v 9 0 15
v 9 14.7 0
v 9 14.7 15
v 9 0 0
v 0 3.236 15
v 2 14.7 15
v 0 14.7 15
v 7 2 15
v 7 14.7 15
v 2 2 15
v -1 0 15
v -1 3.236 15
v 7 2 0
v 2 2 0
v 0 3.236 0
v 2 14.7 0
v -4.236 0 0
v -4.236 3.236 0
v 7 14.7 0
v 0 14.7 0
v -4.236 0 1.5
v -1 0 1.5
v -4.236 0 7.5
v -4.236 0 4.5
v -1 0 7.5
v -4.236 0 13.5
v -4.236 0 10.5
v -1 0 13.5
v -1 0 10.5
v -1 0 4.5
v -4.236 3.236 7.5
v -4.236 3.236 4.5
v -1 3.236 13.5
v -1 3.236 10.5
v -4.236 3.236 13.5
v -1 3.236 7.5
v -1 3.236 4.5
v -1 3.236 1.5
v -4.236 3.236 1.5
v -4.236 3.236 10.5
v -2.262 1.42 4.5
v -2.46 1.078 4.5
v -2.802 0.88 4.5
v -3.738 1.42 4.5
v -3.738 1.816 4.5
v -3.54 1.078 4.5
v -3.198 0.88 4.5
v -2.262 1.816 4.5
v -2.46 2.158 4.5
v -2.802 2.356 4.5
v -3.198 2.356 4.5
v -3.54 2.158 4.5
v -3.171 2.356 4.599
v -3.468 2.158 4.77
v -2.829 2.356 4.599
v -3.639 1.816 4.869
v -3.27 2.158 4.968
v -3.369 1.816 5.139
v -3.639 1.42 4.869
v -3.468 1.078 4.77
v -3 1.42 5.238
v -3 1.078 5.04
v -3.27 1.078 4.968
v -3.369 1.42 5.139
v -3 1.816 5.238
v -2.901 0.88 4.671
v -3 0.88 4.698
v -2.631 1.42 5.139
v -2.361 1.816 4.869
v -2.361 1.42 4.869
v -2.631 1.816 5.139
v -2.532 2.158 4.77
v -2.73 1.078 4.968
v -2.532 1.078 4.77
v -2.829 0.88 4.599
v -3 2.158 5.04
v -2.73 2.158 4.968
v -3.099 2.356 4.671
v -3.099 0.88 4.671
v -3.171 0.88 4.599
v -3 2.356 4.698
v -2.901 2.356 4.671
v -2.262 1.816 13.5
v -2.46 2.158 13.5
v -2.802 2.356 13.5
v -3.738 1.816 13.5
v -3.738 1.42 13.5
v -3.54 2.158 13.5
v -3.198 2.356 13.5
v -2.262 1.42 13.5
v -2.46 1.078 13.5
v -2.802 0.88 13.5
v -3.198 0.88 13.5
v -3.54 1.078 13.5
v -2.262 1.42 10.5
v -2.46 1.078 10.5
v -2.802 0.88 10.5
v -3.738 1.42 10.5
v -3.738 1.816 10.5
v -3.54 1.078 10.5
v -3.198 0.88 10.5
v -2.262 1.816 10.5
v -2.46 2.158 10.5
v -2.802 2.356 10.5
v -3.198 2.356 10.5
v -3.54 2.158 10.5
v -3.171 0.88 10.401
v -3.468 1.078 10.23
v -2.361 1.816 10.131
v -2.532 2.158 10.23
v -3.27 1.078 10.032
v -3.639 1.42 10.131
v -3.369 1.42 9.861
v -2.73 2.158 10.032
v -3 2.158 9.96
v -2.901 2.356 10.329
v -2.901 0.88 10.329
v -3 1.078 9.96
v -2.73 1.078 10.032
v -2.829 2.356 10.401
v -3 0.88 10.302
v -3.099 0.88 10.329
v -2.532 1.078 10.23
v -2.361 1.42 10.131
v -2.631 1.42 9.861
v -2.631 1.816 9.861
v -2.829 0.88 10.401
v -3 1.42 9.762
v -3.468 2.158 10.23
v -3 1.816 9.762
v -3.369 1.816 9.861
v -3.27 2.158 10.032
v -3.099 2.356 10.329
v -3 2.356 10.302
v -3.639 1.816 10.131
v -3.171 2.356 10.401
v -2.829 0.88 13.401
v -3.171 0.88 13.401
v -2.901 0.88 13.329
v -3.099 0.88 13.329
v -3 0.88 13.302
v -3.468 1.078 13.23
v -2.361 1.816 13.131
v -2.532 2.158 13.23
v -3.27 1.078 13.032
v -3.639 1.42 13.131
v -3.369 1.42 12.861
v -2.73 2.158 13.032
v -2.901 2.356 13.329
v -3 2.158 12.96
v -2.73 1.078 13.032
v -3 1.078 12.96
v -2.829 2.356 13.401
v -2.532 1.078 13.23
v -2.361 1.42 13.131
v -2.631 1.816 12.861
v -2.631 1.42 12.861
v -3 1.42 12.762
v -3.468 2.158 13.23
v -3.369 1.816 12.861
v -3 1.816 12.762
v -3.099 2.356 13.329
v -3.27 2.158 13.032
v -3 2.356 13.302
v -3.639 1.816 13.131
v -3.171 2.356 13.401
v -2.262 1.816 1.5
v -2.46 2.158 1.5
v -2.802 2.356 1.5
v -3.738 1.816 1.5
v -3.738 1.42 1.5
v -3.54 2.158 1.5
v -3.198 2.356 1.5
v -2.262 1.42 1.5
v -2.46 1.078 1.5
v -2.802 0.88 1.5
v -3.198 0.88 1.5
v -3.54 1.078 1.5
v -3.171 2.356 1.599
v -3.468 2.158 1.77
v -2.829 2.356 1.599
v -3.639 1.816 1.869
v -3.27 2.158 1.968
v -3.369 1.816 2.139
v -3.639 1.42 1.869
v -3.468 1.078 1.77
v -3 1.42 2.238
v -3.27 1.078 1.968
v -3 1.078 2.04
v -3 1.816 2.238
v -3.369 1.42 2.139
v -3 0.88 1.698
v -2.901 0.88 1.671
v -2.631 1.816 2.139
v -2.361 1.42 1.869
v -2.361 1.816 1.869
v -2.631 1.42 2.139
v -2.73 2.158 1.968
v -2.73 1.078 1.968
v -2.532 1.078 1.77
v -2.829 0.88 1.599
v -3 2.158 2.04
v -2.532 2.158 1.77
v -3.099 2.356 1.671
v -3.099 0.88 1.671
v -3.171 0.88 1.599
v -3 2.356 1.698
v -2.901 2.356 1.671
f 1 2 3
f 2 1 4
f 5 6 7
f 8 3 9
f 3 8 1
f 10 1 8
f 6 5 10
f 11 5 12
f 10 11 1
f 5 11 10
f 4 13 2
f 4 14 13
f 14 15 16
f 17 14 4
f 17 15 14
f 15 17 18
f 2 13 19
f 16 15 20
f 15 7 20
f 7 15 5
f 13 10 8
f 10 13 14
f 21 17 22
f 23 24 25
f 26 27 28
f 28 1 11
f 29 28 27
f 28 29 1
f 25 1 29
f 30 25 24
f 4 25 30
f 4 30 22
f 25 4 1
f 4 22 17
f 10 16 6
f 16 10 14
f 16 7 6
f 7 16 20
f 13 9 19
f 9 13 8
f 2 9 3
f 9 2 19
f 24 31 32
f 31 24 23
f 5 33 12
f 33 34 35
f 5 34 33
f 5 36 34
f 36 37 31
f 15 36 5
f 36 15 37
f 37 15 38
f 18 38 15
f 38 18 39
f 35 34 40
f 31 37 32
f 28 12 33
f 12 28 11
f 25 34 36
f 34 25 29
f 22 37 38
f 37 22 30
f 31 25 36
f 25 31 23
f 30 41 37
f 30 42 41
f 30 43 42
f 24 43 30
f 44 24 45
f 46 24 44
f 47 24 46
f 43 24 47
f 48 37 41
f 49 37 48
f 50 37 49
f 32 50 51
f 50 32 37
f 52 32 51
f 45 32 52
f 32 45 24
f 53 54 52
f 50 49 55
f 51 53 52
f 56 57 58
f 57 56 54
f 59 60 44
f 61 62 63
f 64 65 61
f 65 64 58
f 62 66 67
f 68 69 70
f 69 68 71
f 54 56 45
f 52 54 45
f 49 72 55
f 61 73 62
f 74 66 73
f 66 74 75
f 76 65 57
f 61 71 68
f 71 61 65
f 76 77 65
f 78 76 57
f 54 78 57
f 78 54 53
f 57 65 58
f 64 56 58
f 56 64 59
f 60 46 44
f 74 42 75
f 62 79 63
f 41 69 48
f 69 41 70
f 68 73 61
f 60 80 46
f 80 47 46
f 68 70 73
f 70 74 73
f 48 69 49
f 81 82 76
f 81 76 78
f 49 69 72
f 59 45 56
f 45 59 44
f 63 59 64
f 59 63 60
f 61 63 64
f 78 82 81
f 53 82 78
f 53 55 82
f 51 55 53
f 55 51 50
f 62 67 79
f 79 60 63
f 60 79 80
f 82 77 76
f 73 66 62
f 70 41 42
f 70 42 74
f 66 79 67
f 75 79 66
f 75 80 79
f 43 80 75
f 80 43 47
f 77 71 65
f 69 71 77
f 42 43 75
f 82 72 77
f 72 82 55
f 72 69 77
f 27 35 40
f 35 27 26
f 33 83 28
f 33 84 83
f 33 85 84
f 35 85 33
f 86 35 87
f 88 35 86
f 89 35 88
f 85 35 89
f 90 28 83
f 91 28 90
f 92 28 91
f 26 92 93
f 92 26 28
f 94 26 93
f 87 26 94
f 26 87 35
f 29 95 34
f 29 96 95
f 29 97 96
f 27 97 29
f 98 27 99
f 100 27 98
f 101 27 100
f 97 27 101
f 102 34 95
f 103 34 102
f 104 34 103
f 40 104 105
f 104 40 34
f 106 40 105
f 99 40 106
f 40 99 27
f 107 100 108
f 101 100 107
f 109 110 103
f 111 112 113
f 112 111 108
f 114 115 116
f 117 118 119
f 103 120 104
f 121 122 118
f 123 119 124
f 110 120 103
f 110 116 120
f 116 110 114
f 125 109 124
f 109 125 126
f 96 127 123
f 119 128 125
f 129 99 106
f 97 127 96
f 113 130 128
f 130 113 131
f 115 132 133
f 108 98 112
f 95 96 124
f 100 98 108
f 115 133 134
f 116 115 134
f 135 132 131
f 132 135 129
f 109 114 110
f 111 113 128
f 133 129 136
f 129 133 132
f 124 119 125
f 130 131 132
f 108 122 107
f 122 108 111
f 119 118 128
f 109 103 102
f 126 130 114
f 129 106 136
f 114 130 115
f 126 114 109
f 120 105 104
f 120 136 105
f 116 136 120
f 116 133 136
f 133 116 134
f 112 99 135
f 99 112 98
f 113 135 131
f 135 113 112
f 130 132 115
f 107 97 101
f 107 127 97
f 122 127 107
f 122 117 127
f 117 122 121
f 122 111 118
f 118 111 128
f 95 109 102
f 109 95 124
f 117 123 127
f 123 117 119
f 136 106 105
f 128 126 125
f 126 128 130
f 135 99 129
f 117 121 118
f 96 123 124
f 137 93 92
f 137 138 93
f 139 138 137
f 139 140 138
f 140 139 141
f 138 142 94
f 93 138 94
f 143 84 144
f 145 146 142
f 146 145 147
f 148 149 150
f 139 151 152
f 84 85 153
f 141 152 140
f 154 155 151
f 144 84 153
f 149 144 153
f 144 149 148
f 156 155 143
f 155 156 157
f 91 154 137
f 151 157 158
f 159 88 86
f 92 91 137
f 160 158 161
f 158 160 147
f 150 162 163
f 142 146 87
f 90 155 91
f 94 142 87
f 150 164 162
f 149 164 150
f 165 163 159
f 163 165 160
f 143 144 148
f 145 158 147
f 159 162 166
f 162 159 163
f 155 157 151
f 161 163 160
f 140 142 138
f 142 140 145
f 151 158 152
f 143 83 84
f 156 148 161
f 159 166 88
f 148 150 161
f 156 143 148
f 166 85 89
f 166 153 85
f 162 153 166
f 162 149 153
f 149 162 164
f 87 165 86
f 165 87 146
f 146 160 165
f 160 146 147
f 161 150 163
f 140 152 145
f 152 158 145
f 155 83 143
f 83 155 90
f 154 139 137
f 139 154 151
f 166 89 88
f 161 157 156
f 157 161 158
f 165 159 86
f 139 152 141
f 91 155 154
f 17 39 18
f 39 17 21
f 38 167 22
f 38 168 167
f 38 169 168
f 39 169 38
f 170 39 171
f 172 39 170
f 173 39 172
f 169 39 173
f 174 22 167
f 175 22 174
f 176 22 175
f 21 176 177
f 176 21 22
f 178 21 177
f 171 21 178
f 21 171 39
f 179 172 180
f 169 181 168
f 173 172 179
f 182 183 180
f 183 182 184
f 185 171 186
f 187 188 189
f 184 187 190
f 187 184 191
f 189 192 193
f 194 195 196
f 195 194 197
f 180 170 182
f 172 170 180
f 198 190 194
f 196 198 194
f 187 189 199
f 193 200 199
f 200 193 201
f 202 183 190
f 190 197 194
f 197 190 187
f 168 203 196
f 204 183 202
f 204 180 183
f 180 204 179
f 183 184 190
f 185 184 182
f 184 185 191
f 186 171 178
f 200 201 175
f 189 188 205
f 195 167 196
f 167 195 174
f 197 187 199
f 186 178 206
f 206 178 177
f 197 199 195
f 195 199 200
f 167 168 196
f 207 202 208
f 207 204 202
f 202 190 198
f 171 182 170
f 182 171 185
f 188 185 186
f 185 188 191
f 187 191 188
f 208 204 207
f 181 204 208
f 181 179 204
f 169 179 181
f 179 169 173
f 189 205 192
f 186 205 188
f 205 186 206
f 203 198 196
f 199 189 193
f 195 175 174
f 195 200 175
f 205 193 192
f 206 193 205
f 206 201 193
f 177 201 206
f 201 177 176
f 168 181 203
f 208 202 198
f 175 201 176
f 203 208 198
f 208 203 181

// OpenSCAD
// file: hinge.scad
goldenratio = 1.6180339;

//hinge(2, 15, 4, $fn=12);
hinge(2, 20, 4, $fn=12);

module hinge(thickness, length, notchdepth)
{
	joinwidth = 1;
	joinfactor = 0.25;

	notchlength = length / 5;
	halfnotchlength = notchlength / 2;

	dimpleradius = thickness/goldenratio/goldenratio/goldenratio;  // Not the same as... //dimpleradius = thickness/(goldenratio*3);
	
	dimpleoffset = notchdepth / goldenratio;

	// First, lay down an area that can be joined to other objects
	// lay it flat in the x-y plane
	cube(size=[joinwidth, length, thickness]);

	// Lay in the tongues

	// First tongue is a half notch with an extruded dimple
	translate([joinwidth, 0, 0])
	cube(size=[notchdepth, halfnotchlength, thickness]);
	translate([joinwidth+dimpleoffset, halfnotchlength, thickness/2])
	sphere(r=dimpleradius);

	// Second tongue has a recess in the near side
	difference()
	{
		translate([joinwidth, halfnotchlength+notchlength, 0])
		cube(size=[notchdepth, notchlength, thickness]);
	
		translate([joinwidth+dimpleoffset, halfnotchlength+notchlength, thickness/2])
		sphere(r=dimpleradius);
	}

	// The last tongue has both a extrusion and intrusion
	// extrusion on the near side, intrusion far side
	difference()
	{
		union()
		{	
			translate([joinwidth, halfnotchlength+3*notchlength, 0])
			cube(size=[notchdepth, notchlength, thickness]);
	
			translate([joinwidth+dimpleoffset, halfnotchlength+3*notchlength, thickness/2])
			sphere(r=dimpleradius);
	
		}
		translate([joinwidth+dimpleoffset, halfnotchlength+4*notchlength, thickness/2])
		sphere(r=dimpleradius);
	}
}
// file: UClip.scad
// This clip is meant to fit within a cutout slot 
// It has a tab for the cutout on one side
// and a slot for the panel on the other side
module UClip(length, extent, thickness, gap)
{
baselength = 2*thickness+gap;

tablength = 5.25;
tabheight = 10;
tabwidth = gap;

	union()
	{
		// Base wall along x-axis
		cube(size=[baselength, thickness, length]);

		// Panel clip along y-axis
		translate([0, thickness-0.25, 0])
		cube(size=[thickness, extent+0.25, length]);
		translate([thickness+gap, thickness-0.25, 0])
		cube(size=[thickness, extent+0.25, length]);
	}
}
// main file
use <UClip.scad>
use <hinge.scad>

goldenratio = 1.61803399; 
gDefaultExtent = 25.4/2; 
gDefaultGap = 5; // MakerBot plywood
gDefaultThickness = 2;
gDefaultLength = 15;

HingedUClip(gDefaultLength, gDefaultExtent, gDefaultThickness, gDefaultGap);

module HingedUClip(length, extent, thickness, gap)
{
	union()
	{
		UClip(length, extent, thickness, gap);
	
		rotate([-90,-180, 0])
		//translate([0, 0, -thickness])
		hinge(thickness*goldenratio, length, notchdepth=thickness*goldenratio, $fn=12 );
	}
}
